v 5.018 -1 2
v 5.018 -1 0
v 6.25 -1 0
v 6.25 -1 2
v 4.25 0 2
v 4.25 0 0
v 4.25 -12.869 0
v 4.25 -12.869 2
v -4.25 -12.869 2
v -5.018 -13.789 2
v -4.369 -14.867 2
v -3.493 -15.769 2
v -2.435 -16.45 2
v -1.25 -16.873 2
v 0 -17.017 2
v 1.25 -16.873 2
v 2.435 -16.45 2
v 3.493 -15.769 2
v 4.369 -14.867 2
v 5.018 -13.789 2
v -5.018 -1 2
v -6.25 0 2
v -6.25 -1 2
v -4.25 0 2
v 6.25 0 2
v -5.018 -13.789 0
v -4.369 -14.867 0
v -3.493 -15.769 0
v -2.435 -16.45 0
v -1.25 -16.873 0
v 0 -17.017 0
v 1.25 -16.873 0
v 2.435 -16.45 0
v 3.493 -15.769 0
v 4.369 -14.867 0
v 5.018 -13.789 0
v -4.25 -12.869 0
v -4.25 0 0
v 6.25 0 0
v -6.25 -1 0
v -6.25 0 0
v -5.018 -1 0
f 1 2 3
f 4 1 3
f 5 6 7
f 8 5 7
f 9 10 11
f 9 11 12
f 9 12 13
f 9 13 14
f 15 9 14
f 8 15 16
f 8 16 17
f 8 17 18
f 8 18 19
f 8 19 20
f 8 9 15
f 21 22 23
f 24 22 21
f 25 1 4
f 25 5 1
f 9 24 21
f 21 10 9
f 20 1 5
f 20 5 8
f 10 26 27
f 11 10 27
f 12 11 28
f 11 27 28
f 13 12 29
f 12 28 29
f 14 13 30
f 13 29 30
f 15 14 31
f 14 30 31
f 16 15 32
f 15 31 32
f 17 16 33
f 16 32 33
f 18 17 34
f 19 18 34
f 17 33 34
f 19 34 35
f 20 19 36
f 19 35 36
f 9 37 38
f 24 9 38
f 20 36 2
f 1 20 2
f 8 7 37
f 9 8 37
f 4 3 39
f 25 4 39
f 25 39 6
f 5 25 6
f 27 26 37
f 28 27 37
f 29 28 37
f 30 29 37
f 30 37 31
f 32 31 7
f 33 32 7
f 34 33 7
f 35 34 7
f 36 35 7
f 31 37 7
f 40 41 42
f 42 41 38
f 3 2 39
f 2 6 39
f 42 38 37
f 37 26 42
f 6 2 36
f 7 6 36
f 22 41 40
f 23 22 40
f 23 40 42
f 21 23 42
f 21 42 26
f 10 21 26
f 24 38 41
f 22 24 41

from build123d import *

# Parameters (mm, degrees)
F1_DEPTH = 2


with BuildPart() as f1:
    # F0 (on Top) → F1 (new body)
    with BuildSketch(Plane.XY):
        with BuildLine():
            Line((-4.25, -12.868576), (-4.25, 0))
            Line((-4.25, 0), (-6.25, 0))
            Line((-6.25, 0), (-6.25, -1))
            Line((-6.25, -1), (-5.018, -1))
            Line((-5.018, -1), (-5.018, -13.788901))
            ThreePointArc((-5.018, -13.788901), (0, -17.016697), (5.018, -13.788901))
            Line((5.018, -13.788901), (5.018, -1))
            Line((5.018, -1), (6.25, -1))
            Line((6.25, -1), (6.25, 0))
            Line((6.25, 0), (4.25, 0))
            Line((4.25, 0), (4.25, -12.868576))
            Line((4.25, -12.868576), (-4.25, -12.868576))
        make_face()
    extrude(amount=F1_DEPTH)


solid = f1.part
